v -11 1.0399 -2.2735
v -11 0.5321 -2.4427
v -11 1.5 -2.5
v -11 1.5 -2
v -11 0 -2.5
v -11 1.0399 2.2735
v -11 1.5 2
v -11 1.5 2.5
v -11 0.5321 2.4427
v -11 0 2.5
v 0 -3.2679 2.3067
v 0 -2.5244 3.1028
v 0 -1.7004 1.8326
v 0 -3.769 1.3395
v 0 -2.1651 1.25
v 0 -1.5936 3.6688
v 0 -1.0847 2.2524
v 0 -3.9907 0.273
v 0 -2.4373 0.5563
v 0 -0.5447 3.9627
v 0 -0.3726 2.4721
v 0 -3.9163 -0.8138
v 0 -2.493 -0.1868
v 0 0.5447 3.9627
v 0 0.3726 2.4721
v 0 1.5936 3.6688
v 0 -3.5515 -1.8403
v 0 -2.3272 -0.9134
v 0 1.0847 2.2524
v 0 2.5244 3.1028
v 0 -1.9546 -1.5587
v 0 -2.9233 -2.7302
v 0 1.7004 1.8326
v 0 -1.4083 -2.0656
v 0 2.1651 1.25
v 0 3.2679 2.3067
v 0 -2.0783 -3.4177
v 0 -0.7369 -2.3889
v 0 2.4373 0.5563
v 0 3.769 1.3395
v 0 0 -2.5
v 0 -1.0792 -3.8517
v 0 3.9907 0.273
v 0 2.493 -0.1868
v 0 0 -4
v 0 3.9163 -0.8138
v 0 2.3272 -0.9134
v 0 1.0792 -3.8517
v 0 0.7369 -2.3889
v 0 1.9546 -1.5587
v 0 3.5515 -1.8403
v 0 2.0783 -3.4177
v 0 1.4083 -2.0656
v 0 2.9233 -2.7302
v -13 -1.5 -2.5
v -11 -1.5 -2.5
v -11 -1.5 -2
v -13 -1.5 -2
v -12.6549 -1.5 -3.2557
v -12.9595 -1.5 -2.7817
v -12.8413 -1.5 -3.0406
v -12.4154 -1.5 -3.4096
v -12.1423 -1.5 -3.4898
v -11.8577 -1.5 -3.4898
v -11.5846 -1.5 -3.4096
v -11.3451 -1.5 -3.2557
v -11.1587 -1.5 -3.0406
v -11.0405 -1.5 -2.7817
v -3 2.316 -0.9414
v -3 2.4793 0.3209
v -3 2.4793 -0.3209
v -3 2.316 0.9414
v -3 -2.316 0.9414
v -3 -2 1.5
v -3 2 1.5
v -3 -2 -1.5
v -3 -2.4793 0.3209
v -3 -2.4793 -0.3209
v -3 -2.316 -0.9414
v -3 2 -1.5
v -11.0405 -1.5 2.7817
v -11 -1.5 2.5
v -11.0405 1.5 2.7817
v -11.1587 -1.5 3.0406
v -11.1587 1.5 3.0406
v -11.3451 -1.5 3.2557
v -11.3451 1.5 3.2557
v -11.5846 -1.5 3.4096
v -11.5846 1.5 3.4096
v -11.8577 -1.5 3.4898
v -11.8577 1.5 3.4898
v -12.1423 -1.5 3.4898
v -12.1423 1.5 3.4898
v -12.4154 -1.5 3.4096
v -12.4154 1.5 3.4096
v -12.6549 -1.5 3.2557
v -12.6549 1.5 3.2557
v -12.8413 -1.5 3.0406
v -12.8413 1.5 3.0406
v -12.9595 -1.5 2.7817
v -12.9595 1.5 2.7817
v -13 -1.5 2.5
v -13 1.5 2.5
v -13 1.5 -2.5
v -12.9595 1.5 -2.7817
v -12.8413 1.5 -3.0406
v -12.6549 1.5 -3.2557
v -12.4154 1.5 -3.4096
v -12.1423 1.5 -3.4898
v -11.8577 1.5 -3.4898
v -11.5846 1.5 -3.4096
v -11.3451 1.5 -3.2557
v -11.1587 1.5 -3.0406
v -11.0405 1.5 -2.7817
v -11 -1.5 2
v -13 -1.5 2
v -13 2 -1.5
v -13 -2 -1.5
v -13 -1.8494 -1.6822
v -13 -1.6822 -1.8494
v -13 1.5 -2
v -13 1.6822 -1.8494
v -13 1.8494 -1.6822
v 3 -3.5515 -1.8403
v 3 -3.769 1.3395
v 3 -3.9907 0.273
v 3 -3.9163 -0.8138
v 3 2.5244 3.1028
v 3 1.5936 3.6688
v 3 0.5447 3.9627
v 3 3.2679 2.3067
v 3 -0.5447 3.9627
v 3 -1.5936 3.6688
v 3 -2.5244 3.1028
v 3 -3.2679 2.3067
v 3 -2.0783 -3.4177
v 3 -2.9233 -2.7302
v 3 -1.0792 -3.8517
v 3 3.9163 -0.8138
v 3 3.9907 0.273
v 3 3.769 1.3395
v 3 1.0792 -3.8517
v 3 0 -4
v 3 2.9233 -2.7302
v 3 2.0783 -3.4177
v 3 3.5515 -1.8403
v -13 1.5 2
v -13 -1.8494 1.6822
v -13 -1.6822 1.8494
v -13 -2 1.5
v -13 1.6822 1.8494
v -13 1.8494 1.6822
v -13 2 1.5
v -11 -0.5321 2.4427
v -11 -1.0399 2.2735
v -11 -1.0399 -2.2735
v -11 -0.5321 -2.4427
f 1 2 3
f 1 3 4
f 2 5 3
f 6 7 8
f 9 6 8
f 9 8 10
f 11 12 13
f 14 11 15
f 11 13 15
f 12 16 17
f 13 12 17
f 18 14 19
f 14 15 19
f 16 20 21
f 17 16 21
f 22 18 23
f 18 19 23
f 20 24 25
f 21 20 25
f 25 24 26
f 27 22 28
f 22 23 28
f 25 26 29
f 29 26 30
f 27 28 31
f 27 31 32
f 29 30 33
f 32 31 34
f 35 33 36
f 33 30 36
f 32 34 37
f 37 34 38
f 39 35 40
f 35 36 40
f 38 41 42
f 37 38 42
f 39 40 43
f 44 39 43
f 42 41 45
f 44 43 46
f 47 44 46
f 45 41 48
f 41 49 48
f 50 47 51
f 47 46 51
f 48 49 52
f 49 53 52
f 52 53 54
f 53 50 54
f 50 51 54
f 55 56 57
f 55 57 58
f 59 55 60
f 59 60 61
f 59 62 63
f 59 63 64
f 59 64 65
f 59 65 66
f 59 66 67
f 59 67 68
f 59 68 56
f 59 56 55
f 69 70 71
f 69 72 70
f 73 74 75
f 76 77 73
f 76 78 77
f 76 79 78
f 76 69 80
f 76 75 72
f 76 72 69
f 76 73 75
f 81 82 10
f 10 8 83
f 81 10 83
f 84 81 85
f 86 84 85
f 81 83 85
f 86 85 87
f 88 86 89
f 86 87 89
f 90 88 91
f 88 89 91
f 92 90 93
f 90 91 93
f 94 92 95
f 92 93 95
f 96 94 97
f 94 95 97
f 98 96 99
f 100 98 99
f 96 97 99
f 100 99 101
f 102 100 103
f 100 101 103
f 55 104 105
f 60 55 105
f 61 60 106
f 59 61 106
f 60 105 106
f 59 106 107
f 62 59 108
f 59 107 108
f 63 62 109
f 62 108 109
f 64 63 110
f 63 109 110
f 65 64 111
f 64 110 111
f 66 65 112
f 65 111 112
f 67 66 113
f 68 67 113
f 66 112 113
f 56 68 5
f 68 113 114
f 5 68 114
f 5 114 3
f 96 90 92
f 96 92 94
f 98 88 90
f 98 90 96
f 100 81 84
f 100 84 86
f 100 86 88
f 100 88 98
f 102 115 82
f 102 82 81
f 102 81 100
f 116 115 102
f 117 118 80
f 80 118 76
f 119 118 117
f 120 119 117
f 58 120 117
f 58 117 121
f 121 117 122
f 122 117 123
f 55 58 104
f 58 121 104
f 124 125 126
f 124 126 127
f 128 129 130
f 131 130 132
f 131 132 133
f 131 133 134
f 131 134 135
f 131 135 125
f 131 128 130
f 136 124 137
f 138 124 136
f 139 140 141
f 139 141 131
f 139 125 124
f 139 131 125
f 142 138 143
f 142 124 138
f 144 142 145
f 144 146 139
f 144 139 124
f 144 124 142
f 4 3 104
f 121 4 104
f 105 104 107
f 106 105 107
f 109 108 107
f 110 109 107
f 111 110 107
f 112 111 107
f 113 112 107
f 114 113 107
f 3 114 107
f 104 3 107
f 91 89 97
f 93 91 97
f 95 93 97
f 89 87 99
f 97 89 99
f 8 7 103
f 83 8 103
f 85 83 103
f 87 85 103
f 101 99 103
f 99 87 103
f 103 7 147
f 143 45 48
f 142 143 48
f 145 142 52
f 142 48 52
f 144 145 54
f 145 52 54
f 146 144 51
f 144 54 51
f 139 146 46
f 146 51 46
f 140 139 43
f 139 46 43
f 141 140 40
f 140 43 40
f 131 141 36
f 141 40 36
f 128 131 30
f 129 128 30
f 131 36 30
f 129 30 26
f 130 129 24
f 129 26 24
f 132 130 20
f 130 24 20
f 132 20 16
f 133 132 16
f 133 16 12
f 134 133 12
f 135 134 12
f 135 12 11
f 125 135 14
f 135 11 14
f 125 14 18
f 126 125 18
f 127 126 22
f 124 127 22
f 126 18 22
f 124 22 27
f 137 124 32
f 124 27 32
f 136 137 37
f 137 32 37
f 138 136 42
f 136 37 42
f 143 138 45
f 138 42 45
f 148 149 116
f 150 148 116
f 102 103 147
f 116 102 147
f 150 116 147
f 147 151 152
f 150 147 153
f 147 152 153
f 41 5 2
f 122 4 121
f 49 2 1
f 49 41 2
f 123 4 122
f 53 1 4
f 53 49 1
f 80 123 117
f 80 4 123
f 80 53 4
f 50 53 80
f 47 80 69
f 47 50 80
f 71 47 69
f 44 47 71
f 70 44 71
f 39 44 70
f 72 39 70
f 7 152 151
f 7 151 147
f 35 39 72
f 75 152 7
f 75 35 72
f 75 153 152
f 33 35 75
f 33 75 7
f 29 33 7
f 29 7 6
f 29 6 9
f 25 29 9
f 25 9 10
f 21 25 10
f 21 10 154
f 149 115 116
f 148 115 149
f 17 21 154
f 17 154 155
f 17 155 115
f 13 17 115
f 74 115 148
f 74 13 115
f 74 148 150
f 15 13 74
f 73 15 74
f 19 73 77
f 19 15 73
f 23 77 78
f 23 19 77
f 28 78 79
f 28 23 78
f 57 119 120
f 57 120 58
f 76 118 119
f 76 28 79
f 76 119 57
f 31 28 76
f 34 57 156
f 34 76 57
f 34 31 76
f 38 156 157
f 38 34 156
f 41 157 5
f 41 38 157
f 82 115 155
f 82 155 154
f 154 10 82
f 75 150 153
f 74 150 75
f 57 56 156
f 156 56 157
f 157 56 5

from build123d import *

# Parameters (mm, degrees)
SKETCH1_R               = 4
BOSS_EXTRUDE1_DEPTH     = 3
SKETCH1_3_R             = 2.5
BOSS_EXTRUDE2_DEPTH     = 13
BOSS_EXTRUDE3_DEPTH     = 1.5
CUT_EXTRUDE1_DEPTH      = 15.177446879
CUT_EXTRUDE1_DEPTH_BACK = 15.177446879
SKETCH2_W               = 10
SKETCH2_H               = 3


with BuildPart() as part:
    # Sketch1 → Boss-Extrude1 (new body)
    with BuildSketch(Plane(origin=(0, 0, 0), x_dir=(0, 0, -1), z_dir=(1, 0, 0))):
        Circle(SKETCH1_R)
    extrude(amount=BOSS_EXTRUDE1_DEPTH)

    # Sketch1<3> → Boss-Extrude2 (add)
    with BuildSketch(Plane(origin=(0, 0, 0), x_dir=(0, 0, -1), z_dir=(1, 0, 0))):
        Circle(SKETCH1_3_R)
    extrude(amount=-BOSS_EXTRUDE2_DEPTH)

    # Sketch3 → Boss-Extrude3 (add, symmetric)
    with BuildSketch(Plane(origin=(0, 0, 0), x_dir=(1, 0, 0), z_dir=(0, 1, 0))):
        with BuildLine():
            Line((-11, 2.5), (-11, -2.5))
            ThreePointArc((-11, -2.5), (-12, -3.5), (-13, -2.5))
            Line((-13, -2.5), (-13, 2.5))
            ThreePointArc((-13, 2.5), (-12, 3.5), (-11, 2.5))
        make_face()
    extrude(amount=BOSS_EXTRUDE3_DEPTH, both=True)

    # Sketch2 → Cut-Extrude1 (cut, two sides: drawn at the far end of the back side and taken through both)
    with BuildSketch(Plane(origin=(0, 0, 0), x_dir=(1, 0, 0), z_dir=(0, 1, 0)).offset(-CUT_EXTRUDE1_DEPTH_BACK)):
        with Locations((-8, 0)):
            Rectangle(SKETCH2_W, SKETCH2_H)
    extrude(amount=CUT_EXTRUDE1_DEPTH + CUT_EXTRUDE1_DEPTH_BACK, mode=Mode.SUBTRACT)


solid = part.part
